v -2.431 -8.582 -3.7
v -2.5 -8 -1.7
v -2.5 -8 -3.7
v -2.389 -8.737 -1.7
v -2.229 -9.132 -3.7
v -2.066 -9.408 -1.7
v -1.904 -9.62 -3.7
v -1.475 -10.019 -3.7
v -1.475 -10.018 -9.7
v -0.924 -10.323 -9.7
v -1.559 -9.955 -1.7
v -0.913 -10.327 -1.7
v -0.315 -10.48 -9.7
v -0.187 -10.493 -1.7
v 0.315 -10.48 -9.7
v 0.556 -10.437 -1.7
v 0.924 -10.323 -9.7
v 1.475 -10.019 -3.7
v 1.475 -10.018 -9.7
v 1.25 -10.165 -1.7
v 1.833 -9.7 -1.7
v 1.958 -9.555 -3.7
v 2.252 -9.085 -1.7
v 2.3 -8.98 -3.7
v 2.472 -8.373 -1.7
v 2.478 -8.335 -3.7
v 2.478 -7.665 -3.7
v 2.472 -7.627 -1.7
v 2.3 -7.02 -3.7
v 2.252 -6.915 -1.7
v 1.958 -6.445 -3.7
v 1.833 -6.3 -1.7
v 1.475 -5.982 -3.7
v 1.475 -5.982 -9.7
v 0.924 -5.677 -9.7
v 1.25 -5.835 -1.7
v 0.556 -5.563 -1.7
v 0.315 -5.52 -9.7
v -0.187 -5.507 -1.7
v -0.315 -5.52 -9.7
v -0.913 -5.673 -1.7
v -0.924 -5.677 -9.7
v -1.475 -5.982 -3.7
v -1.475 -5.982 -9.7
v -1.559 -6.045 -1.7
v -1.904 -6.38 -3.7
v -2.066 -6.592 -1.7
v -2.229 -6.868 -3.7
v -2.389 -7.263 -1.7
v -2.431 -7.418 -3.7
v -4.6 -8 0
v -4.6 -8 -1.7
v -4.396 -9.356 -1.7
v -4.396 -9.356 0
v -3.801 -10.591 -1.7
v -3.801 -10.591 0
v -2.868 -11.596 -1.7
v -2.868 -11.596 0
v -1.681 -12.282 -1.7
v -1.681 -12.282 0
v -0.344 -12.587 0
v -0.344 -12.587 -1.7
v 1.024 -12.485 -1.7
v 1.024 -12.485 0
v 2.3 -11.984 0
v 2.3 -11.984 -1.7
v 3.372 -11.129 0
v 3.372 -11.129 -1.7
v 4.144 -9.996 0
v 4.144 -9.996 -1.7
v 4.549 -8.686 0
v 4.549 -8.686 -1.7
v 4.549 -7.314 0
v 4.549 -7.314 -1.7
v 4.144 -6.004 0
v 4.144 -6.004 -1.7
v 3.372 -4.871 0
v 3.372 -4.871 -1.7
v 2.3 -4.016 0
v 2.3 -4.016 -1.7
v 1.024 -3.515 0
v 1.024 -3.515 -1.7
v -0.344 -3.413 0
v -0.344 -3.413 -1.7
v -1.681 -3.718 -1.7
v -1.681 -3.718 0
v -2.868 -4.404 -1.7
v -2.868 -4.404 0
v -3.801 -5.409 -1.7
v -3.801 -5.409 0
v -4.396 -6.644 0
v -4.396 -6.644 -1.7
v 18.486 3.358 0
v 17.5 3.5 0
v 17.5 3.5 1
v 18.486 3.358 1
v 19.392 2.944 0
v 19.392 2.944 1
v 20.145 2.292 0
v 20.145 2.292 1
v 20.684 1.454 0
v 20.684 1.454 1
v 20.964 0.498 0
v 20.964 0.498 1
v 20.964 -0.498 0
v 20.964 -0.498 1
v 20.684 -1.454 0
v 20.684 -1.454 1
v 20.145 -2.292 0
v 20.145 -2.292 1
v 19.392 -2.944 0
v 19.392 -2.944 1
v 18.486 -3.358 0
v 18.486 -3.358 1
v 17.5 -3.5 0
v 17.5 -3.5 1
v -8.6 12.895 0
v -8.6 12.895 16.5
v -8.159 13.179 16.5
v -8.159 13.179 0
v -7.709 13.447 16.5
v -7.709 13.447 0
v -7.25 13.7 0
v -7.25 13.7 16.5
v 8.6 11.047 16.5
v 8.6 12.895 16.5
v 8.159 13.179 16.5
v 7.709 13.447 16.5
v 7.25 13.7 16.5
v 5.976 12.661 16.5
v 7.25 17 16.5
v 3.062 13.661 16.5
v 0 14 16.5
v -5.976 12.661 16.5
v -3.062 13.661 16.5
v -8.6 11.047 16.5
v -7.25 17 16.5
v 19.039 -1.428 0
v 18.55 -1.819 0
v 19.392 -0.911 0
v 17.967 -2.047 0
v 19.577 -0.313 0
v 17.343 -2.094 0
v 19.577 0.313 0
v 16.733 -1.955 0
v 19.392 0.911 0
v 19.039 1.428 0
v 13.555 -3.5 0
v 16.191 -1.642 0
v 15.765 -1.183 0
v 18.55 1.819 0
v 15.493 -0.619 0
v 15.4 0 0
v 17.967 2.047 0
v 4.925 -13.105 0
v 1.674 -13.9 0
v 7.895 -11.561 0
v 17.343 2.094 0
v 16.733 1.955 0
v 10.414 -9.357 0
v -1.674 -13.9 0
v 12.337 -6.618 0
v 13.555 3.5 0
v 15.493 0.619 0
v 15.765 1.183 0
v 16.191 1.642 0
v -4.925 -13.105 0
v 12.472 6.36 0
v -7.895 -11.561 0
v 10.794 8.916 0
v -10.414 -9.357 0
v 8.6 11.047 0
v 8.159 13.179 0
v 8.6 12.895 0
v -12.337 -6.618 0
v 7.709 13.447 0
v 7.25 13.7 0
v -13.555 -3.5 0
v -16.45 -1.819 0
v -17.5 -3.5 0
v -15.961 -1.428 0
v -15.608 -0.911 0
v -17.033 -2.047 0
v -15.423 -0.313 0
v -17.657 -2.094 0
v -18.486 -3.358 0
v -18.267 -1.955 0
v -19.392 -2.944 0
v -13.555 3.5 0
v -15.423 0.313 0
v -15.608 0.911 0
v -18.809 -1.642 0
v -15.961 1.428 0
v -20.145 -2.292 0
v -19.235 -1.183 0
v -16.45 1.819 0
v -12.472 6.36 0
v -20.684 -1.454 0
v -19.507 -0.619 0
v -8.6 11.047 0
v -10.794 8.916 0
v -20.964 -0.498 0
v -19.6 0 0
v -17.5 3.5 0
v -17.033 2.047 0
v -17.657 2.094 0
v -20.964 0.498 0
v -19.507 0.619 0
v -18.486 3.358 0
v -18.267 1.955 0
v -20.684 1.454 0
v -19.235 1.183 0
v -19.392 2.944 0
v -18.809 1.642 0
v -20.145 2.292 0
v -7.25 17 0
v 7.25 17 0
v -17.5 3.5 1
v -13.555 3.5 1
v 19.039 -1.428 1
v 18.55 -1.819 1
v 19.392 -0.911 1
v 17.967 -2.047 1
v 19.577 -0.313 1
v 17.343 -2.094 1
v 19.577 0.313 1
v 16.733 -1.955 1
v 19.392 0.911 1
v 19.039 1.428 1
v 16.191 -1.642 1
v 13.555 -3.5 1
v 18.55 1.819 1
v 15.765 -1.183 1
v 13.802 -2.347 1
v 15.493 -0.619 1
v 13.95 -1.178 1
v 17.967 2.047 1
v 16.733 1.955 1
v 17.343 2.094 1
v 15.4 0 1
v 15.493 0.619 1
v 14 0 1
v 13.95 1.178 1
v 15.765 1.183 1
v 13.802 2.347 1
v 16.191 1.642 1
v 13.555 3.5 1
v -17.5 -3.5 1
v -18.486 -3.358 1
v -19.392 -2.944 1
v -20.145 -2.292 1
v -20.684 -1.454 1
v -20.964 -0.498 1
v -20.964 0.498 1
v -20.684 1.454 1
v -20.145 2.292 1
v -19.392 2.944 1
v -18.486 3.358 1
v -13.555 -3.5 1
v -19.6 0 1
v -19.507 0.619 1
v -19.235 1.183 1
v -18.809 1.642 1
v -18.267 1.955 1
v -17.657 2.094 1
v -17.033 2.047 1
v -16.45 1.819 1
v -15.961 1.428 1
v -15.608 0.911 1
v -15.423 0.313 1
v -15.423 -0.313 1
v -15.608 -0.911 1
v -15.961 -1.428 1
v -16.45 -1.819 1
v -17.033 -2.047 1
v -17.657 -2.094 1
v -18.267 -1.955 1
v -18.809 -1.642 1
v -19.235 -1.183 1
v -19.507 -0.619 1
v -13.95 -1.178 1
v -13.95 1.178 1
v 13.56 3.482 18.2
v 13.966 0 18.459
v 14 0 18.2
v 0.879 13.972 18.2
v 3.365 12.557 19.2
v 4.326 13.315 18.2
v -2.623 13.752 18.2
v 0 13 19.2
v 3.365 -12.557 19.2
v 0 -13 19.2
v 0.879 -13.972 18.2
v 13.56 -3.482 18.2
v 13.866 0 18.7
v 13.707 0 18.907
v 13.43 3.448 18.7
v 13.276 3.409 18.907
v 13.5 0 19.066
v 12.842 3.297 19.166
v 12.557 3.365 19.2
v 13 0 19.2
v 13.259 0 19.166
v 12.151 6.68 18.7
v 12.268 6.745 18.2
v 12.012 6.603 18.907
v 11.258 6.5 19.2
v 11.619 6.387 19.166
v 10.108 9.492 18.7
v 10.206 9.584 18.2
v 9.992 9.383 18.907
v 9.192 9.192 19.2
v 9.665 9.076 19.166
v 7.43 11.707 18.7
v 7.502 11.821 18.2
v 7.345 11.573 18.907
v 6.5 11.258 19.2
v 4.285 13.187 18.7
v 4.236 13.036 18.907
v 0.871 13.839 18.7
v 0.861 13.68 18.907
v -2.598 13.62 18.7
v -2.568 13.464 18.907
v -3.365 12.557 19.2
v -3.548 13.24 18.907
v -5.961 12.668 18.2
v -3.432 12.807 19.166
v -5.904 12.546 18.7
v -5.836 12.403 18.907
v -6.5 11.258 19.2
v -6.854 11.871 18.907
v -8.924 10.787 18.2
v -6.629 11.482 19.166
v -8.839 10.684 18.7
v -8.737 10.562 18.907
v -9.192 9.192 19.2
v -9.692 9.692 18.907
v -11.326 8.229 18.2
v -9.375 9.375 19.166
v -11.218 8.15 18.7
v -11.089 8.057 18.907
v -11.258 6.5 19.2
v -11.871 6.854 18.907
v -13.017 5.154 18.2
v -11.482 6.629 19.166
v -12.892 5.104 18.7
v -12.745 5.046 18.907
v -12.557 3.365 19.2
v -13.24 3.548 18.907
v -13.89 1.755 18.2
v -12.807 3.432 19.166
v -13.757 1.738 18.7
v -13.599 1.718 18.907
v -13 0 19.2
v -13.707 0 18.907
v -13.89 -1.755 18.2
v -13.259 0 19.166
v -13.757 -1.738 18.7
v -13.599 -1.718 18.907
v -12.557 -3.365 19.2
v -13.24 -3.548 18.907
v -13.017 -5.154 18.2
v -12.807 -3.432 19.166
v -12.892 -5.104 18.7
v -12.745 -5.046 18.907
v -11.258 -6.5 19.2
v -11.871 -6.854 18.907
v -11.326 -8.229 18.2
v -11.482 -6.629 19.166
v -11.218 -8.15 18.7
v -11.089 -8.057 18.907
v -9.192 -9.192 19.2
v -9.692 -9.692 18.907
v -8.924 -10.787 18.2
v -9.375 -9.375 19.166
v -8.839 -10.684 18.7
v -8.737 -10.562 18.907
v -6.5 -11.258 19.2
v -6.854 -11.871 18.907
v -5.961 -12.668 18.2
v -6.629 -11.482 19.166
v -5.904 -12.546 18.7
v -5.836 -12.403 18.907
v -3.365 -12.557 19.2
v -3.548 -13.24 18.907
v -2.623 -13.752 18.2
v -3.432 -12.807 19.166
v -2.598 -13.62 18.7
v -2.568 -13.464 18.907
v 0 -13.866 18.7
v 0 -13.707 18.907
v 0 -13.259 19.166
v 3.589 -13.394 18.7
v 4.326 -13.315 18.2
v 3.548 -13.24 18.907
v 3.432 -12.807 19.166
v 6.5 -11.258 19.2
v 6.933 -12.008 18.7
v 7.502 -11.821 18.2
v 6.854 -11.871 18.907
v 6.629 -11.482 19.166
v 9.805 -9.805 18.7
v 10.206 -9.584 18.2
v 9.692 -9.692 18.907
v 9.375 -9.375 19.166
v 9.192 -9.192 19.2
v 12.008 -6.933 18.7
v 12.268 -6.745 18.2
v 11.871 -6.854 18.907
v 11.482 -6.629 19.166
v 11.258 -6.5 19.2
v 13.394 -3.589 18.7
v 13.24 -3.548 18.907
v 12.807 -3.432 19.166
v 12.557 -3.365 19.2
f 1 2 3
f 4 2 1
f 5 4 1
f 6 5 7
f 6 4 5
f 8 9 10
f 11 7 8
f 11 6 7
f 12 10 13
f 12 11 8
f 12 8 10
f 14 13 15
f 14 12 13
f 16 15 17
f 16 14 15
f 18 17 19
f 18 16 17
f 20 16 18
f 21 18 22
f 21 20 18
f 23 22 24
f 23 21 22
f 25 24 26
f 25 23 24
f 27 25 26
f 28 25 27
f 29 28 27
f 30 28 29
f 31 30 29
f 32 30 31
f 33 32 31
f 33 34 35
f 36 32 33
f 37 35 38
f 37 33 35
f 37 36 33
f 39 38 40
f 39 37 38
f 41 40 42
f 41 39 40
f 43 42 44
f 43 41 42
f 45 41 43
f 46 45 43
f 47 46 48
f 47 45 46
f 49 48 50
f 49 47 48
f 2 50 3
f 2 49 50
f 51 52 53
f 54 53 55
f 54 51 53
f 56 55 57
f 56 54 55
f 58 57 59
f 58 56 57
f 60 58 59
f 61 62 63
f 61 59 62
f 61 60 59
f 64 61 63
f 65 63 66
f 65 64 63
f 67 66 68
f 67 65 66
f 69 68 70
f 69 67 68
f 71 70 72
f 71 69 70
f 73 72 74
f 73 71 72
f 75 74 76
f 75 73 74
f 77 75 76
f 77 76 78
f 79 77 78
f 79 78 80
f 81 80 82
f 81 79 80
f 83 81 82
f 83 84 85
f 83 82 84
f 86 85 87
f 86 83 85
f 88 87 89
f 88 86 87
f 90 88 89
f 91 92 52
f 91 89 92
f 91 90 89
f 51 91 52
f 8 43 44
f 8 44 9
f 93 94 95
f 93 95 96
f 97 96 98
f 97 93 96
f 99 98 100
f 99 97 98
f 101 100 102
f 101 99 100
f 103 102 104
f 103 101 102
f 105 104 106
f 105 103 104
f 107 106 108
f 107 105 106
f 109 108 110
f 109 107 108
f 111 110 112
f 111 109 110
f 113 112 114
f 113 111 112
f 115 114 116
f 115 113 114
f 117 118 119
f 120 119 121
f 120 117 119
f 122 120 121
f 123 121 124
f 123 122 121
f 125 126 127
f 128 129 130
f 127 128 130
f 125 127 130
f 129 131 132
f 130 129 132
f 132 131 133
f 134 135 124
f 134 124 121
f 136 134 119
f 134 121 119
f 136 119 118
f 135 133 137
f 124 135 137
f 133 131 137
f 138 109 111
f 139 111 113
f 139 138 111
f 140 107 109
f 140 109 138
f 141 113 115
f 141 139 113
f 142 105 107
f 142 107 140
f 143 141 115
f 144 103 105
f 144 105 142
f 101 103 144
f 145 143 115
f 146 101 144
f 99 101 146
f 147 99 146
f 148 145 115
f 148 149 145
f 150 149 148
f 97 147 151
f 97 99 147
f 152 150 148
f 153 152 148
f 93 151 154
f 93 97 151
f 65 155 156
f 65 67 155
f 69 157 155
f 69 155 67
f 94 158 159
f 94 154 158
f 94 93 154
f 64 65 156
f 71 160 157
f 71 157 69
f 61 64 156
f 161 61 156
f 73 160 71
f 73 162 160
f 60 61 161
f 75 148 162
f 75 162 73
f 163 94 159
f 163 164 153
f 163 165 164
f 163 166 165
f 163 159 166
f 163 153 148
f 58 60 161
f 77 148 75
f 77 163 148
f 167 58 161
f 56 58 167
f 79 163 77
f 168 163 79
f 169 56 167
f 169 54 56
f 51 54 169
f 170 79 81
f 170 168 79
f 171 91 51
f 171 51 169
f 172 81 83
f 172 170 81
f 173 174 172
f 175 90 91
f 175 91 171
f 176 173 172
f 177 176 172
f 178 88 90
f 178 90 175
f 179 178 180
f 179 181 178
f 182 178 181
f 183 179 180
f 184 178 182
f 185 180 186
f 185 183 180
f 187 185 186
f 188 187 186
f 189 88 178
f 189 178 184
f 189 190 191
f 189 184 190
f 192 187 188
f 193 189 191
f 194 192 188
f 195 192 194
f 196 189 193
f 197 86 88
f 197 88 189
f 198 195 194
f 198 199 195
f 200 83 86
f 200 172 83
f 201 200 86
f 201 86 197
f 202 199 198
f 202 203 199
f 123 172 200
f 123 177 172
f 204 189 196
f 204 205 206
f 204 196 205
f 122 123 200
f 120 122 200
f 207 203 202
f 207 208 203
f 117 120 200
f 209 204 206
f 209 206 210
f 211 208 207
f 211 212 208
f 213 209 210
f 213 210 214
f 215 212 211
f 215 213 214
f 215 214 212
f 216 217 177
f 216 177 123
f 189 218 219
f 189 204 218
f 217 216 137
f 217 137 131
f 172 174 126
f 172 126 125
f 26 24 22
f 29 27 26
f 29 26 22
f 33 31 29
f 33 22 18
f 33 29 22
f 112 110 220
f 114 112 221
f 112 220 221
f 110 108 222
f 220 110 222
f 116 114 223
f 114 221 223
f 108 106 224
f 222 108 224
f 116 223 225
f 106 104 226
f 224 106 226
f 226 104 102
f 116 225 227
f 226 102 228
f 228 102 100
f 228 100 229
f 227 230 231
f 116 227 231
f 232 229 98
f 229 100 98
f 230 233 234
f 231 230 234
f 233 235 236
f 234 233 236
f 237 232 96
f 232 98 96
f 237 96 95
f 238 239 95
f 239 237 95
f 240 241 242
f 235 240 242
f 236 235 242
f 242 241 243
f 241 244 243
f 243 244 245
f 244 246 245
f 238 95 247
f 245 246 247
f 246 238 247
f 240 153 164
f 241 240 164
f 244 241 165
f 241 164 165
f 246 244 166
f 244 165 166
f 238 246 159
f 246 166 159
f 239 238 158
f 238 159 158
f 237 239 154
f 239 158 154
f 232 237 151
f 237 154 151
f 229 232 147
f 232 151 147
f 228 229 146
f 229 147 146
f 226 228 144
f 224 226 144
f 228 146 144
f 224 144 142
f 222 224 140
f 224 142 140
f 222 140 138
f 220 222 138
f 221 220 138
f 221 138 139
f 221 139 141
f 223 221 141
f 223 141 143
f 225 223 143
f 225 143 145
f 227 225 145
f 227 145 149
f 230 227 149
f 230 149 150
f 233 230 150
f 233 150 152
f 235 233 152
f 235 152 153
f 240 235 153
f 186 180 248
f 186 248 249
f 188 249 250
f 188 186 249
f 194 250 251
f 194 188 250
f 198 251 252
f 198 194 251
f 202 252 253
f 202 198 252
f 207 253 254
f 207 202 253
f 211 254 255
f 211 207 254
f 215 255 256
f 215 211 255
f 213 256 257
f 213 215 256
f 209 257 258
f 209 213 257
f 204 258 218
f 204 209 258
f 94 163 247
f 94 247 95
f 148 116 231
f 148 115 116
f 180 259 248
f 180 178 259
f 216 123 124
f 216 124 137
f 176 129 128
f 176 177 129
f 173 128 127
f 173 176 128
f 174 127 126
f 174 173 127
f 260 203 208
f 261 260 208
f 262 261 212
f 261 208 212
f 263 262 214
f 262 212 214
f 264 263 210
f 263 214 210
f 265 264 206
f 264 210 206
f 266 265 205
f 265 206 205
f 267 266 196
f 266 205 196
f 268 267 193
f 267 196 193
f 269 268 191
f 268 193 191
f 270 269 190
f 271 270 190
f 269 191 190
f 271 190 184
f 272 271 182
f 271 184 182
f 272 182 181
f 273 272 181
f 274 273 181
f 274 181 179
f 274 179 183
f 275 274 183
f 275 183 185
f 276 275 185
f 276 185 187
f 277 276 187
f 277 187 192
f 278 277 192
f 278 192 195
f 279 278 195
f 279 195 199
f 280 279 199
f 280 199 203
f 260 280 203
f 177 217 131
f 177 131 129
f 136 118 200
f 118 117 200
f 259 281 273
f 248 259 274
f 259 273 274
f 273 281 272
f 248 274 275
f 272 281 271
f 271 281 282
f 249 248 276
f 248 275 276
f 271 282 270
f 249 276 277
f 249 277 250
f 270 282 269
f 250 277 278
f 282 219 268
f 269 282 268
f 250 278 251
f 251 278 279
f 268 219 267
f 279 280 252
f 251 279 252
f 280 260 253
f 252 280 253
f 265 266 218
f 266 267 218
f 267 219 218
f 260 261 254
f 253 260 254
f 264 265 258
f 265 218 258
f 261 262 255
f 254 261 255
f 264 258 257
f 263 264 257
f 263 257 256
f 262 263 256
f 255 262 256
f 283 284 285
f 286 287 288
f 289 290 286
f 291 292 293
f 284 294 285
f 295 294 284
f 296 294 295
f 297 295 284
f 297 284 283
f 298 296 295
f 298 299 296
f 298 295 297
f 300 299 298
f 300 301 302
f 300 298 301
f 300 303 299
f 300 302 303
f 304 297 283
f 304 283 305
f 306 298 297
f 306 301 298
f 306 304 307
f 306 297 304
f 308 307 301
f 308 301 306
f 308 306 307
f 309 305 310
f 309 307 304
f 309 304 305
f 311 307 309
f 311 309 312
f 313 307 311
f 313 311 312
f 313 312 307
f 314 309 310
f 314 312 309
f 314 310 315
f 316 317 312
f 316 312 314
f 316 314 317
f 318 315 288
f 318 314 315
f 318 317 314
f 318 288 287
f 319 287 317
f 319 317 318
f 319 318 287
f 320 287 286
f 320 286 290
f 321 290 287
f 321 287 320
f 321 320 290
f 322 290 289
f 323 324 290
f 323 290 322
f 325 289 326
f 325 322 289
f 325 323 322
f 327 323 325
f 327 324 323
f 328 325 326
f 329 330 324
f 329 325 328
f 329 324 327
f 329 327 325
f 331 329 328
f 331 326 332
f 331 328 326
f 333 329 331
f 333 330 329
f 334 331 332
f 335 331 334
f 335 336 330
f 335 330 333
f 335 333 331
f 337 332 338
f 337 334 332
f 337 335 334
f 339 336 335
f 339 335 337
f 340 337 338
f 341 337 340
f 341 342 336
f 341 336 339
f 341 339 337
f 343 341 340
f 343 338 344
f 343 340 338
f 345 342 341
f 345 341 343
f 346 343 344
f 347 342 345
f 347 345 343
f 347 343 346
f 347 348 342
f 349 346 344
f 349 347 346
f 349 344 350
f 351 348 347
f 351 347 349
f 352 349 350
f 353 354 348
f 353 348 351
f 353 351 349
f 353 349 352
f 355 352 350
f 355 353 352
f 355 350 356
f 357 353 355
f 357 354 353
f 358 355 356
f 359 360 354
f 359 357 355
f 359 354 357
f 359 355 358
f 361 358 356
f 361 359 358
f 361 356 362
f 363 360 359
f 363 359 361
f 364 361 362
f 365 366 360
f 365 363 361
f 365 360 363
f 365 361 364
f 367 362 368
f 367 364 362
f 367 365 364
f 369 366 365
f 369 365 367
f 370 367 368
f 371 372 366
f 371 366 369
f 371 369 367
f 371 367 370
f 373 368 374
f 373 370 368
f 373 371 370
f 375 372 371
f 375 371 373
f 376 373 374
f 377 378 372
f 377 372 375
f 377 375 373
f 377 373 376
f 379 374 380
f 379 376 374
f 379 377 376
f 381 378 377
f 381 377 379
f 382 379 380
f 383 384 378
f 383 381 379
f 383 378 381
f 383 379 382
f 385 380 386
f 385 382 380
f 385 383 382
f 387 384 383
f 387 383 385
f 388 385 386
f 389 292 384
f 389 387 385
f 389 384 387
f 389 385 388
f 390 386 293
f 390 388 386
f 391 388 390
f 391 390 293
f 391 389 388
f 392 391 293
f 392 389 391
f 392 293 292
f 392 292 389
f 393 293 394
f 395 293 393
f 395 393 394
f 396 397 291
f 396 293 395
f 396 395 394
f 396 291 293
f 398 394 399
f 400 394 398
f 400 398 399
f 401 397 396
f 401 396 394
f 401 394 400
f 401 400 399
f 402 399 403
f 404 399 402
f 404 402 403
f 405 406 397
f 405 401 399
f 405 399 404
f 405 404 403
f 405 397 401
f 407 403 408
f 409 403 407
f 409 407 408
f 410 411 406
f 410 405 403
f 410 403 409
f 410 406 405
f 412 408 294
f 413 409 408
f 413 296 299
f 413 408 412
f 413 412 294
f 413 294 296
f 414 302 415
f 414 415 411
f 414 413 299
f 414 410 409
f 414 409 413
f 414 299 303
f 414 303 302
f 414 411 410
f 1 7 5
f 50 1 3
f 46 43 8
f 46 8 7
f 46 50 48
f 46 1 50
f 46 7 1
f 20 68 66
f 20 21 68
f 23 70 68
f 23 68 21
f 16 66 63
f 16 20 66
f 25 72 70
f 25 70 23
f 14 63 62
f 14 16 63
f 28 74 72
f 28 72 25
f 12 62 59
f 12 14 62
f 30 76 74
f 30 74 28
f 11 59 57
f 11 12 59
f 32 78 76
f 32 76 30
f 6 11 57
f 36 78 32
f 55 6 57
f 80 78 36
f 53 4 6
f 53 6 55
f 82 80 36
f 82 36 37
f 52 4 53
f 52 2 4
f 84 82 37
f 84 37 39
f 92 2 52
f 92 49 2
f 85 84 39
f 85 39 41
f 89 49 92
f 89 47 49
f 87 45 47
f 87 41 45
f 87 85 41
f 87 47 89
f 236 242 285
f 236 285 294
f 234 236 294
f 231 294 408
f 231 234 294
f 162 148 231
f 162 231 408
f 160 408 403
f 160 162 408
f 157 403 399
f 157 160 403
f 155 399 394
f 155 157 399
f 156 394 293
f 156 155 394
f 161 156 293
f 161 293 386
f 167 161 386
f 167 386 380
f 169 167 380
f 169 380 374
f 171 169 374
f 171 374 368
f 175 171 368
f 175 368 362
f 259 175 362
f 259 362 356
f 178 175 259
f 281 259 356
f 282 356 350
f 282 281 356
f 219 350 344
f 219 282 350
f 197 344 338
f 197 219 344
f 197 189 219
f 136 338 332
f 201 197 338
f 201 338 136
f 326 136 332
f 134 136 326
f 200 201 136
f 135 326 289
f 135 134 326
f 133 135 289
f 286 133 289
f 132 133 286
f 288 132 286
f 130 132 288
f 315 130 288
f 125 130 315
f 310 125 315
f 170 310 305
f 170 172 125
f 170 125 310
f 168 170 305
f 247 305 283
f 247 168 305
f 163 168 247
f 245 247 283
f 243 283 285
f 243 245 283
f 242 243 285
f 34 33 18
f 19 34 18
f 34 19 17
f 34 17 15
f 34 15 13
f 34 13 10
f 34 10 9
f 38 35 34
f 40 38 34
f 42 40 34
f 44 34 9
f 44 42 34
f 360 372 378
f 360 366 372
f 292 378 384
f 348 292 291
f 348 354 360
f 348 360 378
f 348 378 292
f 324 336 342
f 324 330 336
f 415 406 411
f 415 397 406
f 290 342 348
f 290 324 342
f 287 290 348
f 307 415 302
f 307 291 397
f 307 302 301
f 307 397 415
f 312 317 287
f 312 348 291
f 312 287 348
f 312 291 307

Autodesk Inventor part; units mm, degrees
ref_plane "XZ Plane" through (0, 0, 0) normal (0, 1, 0) x (-1, 0, 0)
ref_plane "XY Plane" through (0, 0, 0) normal (0, 0, 1) x (1, 0, 0)
sketch "Náčrt1" plane through (0, 0, 0) normal (0, 0, 1) x (1, 0, 0)
  line L0 (0, 19.6) -> (0, -19.6) projected
  line L1 (-19.6, 0) -> (19.6, 0) projected
  circle A0 centre (0, 0) radius 14
  dimension "d0" = 28
extrude "Vysunutí1" add sketch "Náčrt1" along normal blind 19.2
fillet "Zaoblení1" radius 1 1 edges at (-14, 0, 19.2)
sketch "Náčrt2" plane through (0, 0, 0) normal (0, 0, -1) x (-1, 0, 0)
  line L0 (-7.25, 11) -> (7.25, 11)
  line L1 (7.25, 11) -> (7.25, 17)
  line L2 (7.25, 17) -> (-7.25, 17)
  line L3 (-7.25, 17) -> (-7.25, 11)
  circle A0 centre (0, 0) radius 14 projected
  line L4 (-7.25, 11) -> (7.25, 17) construction
  line L5 (7.25, 11) -> (-7.25, 17) construction
  circle A1 centre (0, 0) radius 15.5
  line L6 (-8.6, 12.8953) -> (-8.6, 11.0472)
  line L7 (8.6, 12.8953) -> (8.6, 11.0472)
  point P0 (0, 14)
  point P1 (0, 14)
  point P2 (7.25, 13.6999)
  point P3 (-7.25, 13.6999)
  dimension "d4" = 14.5
  dimension "d5" = 31
  dimension "d6" = 17.2
  dimension "d7" = 1.35
  dimension "d8" = 1.35
  dimension "d9" = 1.5
extrude "Vysunutí2" add sketch "Náčrt2" against normal blind 16.5 contours A0 L6 A1 L3 | L3 A1 L1 A0 | L1 A1 L7 A0 | L3 L2 L1 A1
sketch "Náčrt3" plane through (0, 0, 0) normal (0, 0, -1) x (-1, 0, 0)
  circle A0 centre (0, -8) radius 4.6
  line L0 (0, -12.6) -> (0, -14) construction
  arc A1 (-8.6, 11.0472) -> (8.6, 11.0472) centre (0, 0) ccw construction
  dimension "d12" = 9.2
  dimension "d14" = 1.4
extrude "Vysunutí3" add sketch "Náčrt3" along normal blind 1.7
sketch "Náčrt4" plane through (0, -8, -1.7) normal (0, 0, -1) x (-1, 0, 0)
  circle A0 centre (0, 0) radius 4.6 projected
  circle A1 centre (0, 0) radius 2.5
  line L0 (-1.475, 2.0185) -> (-1.475, -2.0185)
  line L1 (1.475, 2.0185) -> (1.475, -2.0185)
  point P0 (0, 8)
  dimension "d17" = 5
  dimension "d18" = 2.95
extrude "Vysunutí4" add sketch "Náčrt4" along normal blind 8 contours L1 A1 L0
sketch "Náčrt5" plane through (0, -8, -1.7) normal (0, 0, -1) x (-1, 0, 0)
  arc A0 (1.475, 2.0185) -> (-1.475, 2.0185) centre (0, 0) ccw projected
  circle A1 centre (0, 0) radius 2.5
  point P0 (0, 8)
  point P1 (-1.475, 2.0185)
  point P2 (1.475, 2.0185)
extrude "Vysunutí5" add sketch "Náčrt5" along normal blind 2
sketch "Sketch6" plane through (0, 0, 0) normal (0, 0, -1) x (-1, 0, 0)
  line L0 (-17.5, 0) -> (17.5, 0) construction
  line L1 (-17.5, -3.5) -> (17.5, -3.5)
  line L2 (17.5, 3.5) -> (-17.5, 3.5)
  arc A0 (-17.5, 3.5) -> (-17.5, -3.5) centre (-17.5, 0) ccw
  arc A1 (17.5, -3.5) -> (17.5, 3.5) centre (17.5, 0) ccw
  circle A2 centre (-17.5, 0) radius 2.1
  circle A3 centre (17.5, 0) radius 2.1
  point P0 (0, 0)
  dimension "d23" = 4.2
  dimension "d24" = 35
  dimension "d25" = 7
extrude "Extrusion6" add sketch "Sketch6" against normal blind 1
equation "\"d7\" = d8"
properties part number "Motor"
